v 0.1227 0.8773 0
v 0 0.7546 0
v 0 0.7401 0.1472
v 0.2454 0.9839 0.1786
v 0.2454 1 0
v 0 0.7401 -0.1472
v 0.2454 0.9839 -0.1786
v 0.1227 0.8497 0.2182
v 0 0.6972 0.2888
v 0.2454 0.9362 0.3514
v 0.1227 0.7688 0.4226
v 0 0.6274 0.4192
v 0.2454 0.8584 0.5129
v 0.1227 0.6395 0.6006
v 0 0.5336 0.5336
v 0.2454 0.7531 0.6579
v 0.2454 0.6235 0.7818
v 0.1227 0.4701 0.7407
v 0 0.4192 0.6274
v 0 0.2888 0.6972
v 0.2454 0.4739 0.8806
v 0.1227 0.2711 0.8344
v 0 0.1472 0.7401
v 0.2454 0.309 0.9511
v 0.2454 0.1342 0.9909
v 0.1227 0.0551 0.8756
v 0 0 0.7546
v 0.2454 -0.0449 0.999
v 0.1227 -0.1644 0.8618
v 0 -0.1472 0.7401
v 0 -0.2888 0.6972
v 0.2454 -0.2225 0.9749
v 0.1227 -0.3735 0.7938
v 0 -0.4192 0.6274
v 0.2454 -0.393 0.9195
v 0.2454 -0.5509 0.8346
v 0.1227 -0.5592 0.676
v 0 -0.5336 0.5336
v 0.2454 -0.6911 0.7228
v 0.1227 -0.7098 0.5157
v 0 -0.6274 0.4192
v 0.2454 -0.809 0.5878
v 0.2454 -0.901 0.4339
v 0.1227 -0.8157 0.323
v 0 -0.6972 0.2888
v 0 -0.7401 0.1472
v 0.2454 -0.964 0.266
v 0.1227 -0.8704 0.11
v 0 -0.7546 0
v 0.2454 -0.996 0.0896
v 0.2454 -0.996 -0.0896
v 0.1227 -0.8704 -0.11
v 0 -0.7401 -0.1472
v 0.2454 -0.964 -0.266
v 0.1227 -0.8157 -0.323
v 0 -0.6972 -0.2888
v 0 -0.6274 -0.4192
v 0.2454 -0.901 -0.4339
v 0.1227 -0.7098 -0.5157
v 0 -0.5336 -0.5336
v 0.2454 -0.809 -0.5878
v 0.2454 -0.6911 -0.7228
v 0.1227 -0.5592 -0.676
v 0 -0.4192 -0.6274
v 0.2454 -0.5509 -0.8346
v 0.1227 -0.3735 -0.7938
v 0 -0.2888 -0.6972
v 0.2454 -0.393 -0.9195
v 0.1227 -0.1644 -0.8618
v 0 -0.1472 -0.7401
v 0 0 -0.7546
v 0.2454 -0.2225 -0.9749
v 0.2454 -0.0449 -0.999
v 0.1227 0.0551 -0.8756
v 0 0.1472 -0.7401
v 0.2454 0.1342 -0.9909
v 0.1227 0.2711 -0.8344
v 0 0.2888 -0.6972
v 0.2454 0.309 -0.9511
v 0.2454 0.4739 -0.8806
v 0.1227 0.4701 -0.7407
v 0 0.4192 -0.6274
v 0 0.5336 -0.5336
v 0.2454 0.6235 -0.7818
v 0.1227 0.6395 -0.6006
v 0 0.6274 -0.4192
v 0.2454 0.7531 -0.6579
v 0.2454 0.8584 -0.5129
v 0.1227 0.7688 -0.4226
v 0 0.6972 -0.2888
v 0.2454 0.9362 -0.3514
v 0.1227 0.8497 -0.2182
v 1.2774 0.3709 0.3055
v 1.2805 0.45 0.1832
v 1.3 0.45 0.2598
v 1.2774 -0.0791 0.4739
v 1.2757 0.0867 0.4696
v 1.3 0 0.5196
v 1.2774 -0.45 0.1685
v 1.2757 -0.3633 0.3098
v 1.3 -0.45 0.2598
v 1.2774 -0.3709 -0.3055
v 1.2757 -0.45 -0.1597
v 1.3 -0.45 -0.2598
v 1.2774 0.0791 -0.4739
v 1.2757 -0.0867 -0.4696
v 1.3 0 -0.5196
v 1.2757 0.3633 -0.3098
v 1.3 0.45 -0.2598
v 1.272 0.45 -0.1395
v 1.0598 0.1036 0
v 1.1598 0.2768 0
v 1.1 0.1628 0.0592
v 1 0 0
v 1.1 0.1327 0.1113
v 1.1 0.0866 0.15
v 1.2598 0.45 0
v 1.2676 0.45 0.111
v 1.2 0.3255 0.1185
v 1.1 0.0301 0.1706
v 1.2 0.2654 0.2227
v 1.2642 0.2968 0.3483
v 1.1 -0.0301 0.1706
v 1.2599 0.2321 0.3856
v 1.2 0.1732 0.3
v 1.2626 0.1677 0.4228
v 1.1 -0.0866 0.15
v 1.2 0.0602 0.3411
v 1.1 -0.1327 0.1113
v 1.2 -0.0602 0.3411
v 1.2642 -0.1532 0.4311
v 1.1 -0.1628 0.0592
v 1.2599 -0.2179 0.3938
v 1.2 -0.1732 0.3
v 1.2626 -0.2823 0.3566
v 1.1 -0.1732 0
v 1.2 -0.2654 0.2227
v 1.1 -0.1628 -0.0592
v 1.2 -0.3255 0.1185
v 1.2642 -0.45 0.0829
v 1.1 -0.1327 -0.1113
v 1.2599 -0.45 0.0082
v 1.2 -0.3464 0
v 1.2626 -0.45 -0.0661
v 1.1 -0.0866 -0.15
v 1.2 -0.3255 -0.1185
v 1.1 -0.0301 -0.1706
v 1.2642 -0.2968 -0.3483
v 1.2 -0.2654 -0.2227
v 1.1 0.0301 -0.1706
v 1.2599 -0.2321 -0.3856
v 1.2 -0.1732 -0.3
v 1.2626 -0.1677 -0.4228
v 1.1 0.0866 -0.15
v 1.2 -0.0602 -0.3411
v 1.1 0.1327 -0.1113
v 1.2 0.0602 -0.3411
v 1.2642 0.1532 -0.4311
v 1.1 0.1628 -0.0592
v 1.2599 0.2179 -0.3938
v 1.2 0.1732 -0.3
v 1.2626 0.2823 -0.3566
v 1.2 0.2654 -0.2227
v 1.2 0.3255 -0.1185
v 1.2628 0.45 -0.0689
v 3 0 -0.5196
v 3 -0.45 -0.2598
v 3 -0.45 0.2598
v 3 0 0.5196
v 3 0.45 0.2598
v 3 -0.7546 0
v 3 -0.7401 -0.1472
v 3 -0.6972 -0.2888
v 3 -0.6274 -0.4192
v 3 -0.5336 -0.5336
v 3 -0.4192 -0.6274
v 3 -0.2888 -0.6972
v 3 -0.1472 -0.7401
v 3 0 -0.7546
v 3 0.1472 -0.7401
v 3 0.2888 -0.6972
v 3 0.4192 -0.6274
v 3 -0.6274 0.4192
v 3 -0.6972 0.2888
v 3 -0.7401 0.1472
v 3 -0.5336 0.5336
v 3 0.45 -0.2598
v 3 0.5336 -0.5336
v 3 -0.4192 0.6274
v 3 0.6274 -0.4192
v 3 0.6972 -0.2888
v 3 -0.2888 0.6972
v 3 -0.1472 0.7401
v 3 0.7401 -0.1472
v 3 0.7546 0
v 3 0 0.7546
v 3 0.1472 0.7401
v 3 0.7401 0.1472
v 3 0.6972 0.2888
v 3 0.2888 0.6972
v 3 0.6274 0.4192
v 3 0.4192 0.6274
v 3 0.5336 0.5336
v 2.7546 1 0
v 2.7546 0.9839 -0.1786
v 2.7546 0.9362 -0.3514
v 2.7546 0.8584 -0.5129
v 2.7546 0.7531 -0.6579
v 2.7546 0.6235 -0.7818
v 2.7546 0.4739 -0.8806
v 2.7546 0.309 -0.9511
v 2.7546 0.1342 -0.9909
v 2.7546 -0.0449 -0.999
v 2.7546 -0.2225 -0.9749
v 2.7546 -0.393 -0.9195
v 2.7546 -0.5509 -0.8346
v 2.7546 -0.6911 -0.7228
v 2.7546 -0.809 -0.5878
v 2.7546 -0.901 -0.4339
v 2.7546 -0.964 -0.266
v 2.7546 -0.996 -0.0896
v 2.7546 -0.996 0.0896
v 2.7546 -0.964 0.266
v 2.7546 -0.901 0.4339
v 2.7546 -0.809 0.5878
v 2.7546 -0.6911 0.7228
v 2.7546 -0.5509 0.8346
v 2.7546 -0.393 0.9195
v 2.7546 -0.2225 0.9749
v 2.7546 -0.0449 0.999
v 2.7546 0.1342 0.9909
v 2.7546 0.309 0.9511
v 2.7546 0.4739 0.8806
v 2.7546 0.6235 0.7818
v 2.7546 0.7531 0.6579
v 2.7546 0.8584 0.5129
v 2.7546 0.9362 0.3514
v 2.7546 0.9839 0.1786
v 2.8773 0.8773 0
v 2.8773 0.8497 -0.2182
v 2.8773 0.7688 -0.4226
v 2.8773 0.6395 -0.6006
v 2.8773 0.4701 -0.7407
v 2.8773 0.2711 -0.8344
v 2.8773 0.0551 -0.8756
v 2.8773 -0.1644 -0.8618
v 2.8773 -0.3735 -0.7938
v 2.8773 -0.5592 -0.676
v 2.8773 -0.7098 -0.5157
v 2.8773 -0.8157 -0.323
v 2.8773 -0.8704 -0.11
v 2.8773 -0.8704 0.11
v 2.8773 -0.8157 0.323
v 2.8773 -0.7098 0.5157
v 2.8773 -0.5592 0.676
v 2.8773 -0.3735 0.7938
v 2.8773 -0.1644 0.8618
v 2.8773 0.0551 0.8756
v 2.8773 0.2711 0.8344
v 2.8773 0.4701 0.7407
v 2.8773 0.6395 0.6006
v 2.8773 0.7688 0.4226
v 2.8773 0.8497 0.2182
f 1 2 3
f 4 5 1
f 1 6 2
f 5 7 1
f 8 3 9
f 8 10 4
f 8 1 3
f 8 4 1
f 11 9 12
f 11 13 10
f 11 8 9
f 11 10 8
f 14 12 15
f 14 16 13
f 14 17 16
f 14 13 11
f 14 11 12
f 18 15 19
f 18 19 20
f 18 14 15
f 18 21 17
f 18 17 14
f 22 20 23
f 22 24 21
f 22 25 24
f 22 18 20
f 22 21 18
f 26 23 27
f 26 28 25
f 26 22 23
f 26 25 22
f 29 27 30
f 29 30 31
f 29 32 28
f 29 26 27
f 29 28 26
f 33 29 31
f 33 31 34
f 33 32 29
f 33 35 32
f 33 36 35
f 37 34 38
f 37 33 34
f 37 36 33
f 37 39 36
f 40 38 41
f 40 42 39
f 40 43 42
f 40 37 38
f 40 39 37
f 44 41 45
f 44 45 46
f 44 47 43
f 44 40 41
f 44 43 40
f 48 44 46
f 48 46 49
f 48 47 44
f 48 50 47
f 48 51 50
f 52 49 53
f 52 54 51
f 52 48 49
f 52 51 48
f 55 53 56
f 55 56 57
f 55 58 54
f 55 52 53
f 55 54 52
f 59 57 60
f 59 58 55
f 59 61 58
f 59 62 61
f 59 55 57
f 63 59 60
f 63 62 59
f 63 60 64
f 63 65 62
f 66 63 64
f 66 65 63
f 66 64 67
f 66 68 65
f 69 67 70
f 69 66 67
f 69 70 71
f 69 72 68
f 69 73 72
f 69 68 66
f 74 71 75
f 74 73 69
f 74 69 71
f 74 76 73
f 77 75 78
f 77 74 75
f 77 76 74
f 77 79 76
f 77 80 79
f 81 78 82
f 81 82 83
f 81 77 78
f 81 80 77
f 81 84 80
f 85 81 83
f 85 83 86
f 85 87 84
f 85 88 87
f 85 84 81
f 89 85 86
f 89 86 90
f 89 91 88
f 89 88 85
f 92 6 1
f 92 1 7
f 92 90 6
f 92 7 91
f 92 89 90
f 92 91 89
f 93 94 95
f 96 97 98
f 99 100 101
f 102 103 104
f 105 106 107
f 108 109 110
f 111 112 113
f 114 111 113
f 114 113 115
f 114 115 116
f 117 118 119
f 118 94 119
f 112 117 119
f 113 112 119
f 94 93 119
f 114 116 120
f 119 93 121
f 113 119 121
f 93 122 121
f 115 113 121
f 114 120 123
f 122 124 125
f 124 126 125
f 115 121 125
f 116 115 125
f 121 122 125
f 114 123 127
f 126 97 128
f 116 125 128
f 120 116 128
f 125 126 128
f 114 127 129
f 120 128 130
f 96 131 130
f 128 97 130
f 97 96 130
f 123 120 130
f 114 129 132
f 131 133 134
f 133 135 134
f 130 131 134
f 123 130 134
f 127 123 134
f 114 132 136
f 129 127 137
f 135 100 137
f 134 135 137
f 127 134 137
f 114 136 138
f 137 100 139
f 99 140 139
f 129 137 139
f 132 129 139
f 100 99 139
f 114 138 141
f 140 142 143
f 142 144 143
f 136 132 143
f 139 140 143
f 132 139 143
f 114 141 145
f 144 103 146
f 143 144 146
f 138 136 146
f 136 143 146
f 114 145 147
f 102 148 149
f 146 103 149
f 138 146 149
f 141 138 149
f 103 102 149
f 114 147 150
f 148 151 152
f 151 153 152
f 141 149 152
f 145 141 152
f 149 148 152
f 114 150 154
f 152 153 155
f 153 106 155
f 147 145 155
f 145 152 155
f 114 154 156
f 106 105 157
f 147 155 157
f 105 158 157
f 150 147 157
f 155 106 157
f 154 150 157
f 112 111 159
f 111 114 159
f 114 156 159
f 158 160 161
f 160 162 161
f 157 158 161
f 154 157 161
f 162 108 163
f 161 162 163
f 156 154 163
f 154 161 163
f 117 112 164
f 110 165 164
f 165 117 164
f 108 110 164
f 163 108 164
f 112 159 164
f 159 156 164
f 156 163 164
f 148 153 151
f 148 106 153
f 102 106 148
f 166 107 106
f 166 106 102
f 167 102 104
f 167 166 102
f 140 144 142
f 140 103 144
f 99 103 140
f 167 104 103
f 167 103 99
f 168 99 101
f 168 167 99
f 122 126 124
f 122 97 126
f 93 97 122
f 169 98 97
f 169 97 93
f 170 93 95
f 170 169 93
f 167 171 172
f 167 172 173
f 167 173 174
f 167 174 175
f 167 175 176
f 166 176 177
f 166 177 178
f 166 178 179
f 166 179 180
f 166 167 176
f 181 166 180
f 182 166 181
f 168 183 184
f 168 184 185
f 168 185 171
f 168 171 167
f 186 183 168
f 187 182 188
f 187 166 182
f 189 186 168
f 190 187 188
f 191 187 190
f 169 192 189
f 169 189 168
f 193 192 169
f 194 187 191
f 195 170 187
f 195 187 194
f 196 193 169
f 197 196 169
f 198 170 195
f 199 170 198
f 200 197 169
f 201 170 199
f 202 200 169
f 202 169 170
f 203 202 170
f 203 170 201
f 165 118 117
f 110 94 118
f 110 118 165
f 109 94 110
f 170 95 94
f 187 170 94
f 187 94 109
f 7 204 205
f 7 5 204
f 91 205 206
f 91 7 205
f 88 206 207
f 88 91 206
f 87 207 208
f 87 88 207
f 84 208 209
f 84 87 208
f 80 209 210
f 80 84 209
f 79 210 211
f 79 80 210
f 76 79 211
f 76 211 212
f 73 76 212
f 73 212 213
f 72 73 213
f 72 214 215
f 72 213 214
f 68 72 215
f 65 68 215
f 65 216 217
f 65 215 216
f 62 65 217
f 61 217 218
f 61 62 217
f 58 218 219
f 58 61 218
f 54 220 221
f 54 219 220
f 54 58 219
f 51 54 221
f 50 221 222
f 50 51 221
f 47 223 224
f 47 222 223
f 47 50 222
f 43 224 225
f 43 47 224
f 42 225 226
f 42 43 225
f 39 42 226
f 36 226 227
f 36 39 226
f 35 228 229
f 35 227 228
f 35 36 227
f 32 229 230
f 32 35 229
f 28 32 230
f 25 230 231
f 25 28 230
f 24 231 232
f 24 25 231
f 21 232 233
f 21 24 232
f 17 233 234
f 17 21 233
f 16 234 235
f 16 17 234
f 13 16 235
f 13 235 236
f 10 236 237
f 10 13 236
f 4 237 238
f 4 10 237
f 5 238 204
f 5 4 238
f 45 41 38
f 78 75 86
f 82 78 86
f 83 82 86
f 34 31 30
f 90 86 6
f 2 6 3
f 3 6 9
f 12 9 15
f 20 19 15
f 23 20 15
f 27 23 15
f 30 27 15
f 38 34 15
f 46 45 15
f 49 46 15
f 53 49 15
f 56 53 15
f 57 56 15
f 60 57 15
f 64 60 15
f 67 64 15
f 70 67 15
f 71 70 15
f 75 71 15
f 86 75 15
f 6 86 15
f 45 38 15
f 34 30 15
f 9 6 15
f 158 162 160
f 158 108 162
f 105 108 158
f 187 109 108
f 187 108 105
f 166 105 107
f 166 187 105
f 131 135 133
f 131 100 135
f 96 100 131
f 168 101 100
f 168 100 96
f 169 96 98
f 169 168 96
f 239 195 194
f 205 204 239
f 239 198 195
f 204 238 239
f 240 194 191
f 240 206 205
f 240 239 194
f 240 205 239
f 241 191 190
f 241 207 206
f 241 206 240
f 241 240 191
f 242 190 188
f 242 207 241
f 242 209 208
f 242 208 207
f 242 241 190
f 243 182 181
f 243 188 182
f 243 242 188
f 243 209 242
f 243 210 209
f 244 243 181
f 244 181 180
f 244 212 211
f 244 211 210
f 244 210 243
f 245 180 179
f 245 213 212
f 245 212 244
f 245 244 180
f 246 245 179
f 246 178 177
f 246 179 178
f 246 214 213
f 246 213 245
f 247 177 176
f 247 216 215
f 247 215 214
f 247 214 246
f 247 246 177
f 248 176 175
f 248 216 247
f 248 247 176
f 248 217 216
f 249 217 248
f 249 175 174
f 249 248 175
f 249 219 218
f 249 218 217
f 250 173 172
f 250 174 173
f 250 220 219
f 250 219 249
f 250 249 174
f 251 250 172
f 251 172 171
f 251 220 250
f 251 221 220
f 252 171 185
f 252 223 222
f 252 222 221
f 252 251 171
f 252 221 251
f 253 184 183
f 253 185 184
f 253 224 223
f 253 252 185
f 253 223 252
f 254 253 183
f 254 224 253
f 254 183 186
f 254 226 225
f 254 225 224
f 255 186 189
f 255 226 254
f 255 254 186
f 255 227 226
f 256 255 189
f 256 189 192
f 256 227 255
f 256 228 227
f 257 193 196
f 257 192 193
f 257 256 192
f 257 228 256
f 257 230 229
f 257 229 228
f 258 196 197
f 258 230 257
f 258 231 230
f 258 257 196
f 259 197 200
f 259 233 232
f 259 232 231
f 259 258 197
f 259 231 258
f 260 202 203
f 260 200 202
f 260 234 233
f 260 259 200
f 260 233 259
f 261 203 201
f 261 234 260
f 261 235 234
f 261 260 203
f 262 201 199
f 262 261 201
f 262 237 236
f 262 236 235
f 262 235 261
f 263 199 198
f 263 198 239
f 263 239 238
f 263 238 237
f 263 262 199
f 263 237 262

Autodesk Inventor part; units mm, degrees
ref_plane "YZ Plane" through (0, 0, 0) normal (1, 0, 0) x (0, 1, 0)
ref_plane "XZ Plane" through (0, 0, 0) normal (0, 1, 0) x (-1, 0, 0)
sketch "Skizze1" plane through (0, 0, 0) normal (0, 0, 1) x (1, 0, 0)
  line L0 (0, 0) -> (1, 0)
  line L1 (3, 0.5196) -> (3, 1)
  line L2 (3, 1) -> (0, 1)
  line L3 (3, 0.5196) -> (1.3, 0.5196)
  line L4 (1.3, 0.5196) -> (1, 0)
  line L5 (0, -0.2) -> (0, 1.2) projected
  line L6 (0, 1) -> (0, 0)
  dimension "d0" = 1.7
  dimension "d1" = 60
  dimension "d2" = 2
  dimension "d3" = 1.0392
  dimension "d5" = 3
revolve "Körper" add sketch "Skizze1" angle 360 about axis through (0, 0, 0) along (1, 0, 0)
chamfer "Fase1" distance 0.2454 angle 45 1 edges at (3, -1, 0) measured on face at (3, 0.8252, -0.1212)
sketch "Skizze2" plane through (3, 0, 0) normal (1, 0, 0) x (0, 0, -1)
  circle A0 centre (0, 0) radius 0.5196 projected
  line L0 (-0.2598, 0.45) -> (0.2598, 0.45)
  line L1 (0.2598, 0.45) -> (0.5196, 0)
  line L2 (0.5196, 0) -> (0.2598, -0.45)
  line L3 (0.2598, -0.45) -> (-0.2598, -0.45)
  line L4 (-0.2598, -0.45) -> (-0.5196, 0)
  line L5 (-0.5196, 0) -> (-0.2598, 0.45)
extrude "Loch" add sketch "Skizze2" against normal up to next contours L1 A0 | A0 L2 | L0 A0 | A0 L3 | L5 A0 | A0 L4
thread "Gewinde" size "M2x0.4" class "6g" standard "ISO Metric profile" length 3
chamfer "Fase2" distance 0.2454 angle 45 1 edges at (0, -1, 0) measured on face at (0.9182, 0.9968, -0.0805)
ref_plane "Work Plane1" through (1.5, 0, 0) normal (0, 0.5, 0.866) x (1, 0, 0)
equation "\"d0\" = INTI"
equation "\"d2\" = NND"
equation "\"d3\" = 1.1547 * SW"
equation "\"d5\" = NLG"
equation "\"d7\" = -0.5 * GD1 + 0.5 * NND"
equation "\"d8\" = FAWI"
equation "\"d29\" = -0.5 * GD1 + 0.5 * NND"
equation "\"d11\" = NLG"
equation "\"d13\" = -0.5 * GD1 + 0.5 * NND"
equation "\"d14\" = FAWI"
equation "\"d30\" = -0.5 * GD1 + 0.5 * NND"
equation "\"NND\" = 2"
equation "\"NLG\" = 3"
equation "\"INTI\" = 1.7"
equation "\"FAWI\" = 45deg"
equation "\"SW\" = 0.9"
equation "\"GD1\" = THREADDIA - 1.2269 * PTC"
equation "\"FAWI1\" = 45deg"
equation "\"GUL\" = 0.61345 * PTC"
equation "\"SPD\" = 1"
equation "\"TOA\" = 30deg"
equation "\"THREADDIA\" = 2"
equation "\"PTC\" = 0.4"
equation "\"GAL\" = 0.61345 * PTC"
equation "\"E0\" = 1.155 * SW"
properties part number "BS 4168 - M2 x 3" material "Steel, Mild"
